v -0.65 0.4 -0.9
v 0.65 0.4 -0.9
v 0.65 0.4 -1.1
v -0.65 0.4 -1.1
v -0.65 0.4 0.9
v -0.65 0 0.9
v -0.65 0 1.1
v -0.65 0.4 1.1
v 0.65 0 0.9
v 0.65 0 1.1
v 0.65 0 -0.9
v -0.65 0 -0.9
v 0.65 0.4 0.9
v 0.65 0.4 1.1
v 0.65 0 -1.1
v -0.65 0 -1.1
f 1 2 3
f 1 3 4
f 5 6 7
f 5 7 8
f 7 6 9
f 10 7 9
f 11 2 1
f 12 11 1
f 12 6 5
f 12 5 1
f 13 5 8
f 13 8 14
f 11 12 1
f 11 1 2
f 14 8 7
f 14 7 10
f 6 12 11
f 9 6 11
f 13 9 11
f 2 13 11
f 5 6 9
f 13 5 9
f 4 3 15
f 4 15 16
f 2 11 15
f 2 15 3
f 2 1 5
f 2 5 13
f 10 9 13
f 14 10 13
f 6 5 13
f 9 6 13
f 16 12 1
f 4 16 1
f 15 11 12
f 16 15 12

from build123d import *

# Parameters (mm, degrees)
SKETCH1_W  = 1.3
SKETCH1_H  = 1.8
MB_DEPTH   = 0.4
SKETCH2_W  = 1.3
SKETCH2_H  = 0.4
SB_L_DEPTH = 0.2
SKETCH3_W  = 1.3
SKETCH3_H  = 0.4
SB_R_DEPTH = 0.2


with BuildPart() as part:
    # Sketch1 → MB (new body)
    with BuildSketch(Plane(origin=(0, 0, 0), x_dir=(1, 0, 0), z_dir=(0, 1, 0))):
        Rectangle(SKETCH1_W, SKETCH1_H)
    extrude(amount=MB_DEPTH)


with BuildPart() as body_2:
    # Sketch2 → SB L (new body)
    with BuildSketch(Plane.XY.offset(0.9)):
        with Locations((0, 0.2)):
            Rectangle(SKETCH2_W, SKETCH2_H)
    extrude(amount=SB_L_DEPTH)


with BuildPart() as body_3:
    # Sketch3 → SB R (new body)
    with BuildSketch(Plane(origin=(0, 0, -0.9), x_dir=(-1, 0, 0), z_dir=(0, 0, -1))):
        with Locations((0, 0.2)):
            Rectangle(SKETCH3_W, SKETCH3_H)
    extrude(amount=SB_R_DEPTH)


solid = Compound([part.part, body_2.part, body_3.part])
